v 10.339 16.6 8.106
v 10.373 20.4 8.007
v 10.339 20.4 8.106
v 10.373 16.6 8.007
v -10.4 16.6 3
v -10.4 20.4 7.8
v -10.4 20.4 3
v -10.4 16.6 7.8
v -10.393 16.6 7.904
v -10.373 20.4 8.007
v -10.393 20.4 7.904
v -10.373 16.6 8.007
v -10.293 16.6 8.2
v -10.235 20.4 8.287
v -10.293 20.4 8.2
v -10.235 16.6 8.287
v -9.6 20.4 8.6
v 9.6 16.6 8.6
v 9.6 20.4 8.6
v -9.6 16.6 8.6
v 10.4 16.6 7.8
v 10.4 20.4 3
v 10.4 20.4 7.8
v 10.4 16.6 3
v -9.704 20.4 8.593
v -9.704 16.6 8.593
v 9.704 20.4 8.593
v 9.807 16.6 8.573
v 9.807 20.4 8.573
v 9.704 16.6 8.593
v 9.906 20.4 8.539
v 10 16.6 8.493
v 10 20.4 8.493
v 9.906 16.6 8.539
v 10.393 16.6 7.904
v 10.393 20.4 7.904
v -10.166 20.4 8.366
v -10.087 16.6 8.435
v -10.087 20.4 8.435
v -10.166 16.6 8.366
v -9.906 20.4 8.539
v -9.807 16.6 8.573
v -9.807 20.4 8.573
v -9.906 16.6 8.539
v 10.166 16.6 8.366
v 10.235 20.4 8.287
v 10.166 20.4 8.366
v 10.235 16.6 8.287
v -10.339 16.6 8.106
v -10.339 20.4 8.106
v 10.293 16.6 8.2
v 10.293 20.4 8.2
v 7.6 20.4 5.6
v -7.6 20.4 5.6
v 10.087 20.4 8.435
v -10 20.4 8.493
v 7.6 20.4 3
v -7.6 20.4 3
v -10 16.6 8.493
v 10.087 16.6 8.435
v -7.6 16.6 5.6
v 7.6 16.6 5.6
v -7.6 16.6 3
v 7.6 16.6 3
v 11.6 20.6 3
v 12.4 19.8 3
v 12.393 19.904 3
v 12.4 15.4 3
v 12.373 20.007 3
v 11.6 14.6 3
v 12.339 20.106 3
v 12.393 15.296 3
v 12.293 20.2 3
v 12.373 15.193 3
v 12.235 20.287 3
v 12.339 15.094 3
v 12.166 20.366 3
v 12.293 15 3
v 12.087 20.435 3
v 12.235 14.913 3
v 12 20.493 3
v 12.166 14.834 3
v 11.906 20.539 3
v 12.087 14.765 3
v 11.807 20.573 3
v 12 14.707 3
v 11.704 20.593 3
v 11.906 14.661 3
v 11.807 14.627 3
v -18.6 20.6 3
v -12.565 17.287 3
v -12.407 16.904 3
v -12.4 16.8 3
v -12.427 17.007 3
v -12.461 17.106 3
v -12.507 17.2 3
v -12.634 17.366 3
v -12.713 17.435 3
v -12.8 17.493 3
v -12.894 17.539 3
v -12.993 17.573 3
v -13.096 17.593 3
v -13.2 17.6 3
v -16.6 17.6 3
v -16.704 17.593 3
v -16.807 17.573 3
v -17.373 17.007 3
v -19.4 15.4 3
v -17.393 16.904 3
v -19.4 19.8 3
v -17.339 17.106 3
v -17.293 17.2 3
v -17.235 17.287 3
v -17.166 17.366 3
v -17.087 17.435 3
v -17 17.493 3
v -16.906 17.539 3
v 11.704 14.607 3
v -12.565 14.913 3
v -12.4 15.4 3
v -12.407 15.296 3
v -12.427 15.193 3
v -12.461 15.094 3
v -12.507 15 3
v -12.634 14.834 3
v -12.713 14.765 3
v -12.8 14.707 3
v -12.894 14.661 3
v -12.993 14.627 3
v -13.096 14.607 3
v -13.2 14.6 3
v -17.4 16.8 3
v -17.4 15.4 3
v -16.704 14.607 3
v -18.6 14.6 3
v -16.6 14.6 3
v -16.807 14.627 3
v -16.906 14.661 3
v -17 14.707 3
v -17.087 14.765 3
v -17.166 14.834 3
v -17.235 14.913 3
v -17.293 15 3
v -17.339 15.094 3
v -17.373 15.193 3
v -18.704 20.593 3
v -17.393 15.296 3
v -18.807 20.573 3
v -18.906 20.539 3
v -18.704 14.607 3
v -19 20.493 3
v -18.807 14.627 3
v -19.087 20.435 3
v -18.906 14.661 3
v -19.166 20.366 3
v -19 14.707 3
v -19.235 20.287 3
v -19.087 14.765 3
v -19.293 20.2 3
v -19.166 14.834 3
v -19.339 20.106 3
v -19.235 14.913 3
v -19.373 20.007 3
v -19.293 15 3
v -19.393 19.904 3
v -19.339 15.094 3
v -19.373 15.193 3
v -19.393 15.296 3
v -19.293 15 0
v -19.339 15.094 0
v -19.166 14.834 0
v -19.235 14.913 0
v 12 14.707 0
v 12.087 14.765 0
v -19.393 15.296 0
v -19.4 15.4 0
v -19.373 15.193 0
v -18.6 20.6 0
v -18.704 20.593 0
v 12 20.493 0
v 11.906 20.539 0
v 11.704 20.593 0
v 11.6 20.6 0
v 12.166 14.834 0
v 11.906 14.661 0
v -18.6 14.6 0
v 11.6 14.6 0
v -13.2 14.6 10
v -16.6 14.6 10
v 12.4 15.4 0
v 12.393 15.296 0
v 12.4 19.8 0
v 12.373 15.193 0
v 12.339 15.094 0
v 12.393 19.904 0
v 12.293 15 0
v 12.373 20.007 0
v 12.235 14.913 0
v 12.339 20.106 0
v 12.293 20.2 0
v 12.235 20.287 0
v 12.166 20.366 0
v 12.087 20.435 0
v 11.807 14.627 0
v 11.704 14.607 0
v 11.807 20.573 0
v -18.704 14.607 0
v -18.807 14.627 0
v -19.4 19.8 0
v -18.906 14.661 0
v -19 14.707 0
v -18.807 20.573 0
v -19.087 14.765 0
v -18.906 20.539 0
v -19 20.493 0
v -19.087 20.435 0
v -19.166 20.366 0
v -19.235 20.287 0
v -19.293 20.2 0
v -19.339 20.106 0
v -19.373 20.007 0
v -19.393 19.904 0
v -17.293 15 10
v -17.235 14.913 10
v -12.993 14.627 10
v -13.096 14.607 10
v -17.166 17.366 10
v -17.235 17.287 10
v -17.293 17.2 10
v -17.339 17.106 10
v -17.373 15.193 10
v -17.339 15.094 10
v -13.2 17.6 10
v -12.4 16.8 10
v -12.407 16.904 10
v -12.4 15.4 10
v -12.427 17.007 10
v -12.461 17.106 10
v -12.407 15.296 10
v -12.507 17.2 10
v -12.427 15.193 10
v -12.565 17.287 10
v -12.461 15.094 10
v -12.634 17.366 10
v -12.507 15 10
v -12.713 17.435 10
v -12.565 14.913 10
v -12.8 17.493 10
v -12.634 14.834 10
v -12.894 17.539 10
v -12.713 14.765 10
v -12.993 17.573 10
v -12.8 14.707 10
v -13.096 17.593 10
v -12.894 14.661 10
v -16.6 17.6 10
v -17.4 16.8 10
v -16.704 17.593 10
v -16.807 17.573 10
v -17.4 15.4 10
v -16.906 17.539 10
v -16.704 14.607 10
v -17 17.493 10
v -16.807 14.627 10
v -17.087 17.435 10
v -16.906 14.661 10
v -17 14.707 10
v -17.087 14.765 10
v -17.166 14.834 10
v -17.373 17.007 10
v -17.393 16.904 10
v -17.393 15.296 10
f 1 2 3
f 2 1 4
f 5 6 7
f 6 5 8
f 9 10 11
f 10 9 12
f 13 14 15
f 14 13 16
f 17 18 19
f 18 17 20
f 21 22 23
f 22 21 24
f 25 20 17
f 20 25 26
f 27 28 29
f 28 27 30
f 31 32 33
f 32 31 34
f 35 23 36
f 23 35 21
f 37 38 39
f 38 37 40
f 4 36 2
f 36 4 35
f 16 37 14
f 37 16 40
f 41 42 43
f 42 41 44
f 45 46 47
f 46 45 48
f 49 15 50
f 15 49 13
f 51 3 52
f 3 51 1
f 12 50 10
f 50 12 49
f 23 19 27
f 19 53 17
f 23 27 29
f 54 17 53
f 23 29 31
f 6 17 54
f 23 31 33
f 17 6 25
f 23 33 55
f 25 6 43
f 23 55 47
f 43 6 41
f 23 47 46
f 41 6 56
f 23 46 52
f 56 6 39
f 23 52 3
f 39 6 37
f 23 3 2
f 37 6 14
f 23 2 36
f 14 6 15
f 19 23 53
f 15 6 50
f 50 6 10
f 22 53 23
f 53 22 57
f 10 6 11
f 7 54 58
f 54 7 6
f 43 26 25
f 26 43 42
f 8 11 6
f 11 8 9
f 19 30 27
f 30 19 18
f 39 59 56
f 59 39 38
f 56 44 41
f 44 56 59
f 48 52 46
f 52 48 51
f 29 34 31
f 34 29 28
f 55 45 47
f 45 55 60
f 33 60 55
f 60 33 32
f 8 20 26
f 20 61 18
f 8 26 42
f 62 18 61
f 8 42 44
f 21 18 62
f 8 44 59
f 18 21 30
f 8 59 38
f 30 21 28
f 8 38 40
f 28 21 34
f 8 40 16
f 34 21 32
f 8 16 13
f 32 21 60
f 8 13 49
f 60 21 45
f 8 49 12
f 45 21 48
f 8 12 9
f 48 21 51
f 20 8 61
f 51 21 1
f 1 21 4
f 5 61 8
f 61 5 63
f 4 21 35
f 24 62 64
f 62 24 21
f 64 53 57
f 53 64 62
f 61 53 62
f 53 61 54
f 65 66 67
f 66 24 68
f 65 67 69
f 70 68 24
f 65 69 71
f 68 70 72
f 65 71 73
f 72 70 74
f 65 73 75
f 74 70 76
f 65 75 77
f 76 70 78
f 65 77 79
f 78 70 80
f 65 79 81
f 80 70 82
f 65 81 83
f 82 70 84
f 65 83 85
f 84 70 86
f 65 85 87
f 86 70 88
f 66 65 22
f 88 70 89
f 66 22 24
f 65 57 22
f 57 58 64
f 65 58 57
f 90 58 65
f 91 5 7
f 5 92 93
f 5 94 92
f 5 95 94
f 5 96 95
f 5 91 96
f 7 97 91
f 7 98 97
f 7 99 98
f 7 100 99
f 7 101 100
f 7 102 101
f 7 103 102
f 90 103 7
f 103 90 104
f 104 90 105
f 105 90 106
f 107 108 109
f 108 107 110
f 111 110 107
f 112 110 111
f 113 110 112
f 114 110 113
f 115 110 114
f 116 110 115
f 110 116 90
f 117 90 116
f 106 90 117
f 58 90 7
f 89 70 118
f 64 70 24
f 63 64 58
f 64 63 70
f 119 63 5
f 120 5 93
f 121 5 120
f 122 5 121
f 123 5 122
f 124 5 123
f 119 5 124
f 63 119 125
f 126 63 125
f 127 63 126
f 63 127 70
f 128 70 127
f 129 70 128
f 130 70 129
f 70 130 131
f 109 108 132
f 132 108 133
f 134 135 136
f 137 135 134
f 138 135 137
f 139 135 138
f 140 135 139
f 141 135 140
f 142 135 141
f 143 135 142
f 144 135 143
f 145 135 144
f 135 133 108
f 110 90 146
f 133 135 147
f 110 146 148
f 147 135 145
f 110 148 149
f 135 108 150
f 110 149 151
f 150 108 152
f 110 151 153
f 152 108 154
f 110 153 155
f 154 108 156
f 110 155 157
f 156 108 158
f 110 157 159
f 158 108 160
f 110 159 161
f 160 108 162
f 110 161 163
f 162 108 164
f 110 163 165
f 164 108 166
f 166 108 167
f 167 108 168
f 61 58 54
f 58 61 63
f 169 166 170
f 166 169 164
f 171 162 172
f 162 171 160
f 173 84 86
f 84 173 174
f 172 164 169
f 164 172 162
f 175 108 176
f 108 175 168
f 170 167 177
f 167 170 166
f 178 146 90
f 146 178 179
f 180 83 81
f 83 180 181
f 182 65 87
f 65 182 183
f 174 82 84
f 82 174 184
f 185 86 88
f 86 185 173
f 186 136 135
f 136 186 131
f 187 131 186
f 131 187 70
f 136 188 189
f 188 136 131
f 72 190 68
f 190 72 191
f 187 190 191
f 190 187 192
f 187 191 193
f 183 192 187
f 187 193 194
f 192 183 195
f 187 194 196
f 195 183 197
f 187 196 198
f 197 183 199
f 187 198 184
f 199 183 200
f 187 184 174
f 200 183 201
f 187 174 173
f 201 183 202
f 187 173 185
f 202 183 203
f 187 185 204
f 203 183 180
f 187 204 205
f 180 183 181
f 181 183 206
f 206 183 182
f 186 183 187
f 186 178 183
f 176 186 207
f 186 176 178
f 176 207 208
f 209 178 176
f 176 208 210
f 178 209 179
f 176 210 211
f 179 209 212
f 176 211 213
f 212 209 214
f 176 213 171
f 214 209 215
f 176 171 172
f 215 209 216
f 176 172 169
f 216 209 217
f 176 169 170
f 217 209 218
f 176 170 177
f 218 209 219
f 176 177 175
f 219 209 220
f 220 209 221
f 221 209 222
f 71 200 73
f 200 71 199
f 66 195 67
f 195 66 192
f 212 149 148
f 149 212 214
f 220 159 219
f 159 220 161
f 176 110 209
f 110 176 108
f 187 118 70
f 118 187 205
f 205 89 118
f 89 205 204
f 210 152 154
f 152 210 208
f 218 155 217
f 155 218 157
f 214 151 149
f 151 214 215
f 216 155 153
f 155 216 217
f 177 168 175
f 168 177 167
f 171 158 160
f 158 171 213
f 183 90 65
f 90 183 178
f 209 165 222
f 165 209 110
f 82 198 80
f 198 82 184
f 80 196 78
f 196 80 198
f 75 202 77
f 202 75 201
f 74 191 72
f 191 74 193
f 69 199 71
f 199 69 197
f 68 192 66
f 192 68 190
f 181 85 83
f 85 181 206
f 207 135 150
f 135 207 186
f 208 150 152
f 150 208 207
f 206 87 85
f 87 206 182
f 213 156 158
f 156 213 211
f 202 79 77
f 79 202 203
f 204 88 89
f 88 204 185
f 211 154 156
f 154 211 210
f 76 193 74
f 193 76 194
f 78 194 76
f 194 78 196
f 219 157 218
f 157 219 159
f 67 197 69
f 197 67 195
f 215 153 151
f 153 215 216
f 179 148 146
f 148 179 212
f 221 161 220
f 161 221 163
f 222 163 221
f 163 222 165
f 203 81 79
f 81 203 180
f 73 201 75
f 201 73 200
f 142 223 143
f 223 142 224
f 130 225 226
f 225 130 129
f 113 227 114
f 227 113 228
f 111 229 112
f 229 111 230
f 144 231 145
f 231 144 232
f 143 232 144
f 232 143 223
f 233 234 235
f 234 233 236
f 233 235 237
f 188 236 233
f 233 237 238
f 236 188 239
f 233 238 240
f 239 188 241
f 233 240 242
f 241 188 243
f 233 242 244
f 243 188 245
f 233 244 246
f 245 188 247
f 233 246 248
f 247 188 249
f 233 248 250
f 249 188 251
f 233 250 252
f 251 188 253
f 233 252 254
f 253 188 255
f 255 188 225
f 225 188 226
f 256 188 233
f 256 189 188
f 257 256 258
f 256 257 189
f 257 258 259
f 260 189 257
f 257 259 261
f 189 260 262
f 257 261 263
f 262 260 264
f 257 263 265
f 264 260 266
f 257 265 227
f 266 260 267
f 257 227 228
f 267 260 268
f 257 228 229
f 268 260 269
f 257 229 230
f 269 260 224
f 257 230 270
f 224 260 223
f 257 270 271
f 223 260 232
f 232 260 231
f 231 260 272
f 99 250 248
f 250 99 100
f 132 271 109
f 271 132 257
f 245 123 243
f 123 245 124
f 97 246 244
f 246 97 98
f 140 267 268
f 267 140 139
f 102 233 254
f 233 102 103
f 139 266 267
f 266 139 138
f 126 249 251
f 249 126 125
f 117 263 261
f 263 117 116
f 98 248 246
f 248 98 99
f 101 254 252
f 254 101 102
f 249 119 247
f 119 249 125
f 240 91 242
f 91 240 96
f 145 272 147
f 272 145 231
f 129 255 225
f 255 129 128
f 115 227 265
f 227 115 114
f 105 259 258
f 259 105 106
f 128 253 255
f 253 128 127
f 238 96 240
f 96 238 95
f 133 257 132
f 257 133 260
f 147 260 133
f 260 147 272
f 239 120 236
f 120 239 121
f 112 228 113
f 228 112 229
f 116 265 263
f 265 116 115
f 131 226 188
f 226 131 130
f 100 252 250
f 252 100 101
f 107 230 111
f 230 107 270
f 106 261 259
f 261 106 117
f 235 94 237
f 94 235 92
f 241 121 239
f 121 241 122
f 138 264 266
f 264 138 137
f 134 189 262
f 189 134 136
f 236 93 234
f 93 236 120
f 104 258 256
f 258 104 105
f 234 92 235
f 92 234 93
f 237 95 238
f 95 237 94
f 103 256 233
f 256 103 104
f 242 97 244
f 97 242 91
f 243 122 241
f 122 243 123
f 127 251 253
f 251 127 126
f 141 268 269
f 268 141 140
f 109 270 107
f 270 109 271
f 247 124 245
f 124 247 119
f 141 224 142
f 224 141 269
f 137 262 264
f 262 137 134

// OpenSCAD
// Exact contact and raised strap-slot geometry from the cradle.
include <rack-adapter-locator-cradle.scad>
part = "contact_coupon";
